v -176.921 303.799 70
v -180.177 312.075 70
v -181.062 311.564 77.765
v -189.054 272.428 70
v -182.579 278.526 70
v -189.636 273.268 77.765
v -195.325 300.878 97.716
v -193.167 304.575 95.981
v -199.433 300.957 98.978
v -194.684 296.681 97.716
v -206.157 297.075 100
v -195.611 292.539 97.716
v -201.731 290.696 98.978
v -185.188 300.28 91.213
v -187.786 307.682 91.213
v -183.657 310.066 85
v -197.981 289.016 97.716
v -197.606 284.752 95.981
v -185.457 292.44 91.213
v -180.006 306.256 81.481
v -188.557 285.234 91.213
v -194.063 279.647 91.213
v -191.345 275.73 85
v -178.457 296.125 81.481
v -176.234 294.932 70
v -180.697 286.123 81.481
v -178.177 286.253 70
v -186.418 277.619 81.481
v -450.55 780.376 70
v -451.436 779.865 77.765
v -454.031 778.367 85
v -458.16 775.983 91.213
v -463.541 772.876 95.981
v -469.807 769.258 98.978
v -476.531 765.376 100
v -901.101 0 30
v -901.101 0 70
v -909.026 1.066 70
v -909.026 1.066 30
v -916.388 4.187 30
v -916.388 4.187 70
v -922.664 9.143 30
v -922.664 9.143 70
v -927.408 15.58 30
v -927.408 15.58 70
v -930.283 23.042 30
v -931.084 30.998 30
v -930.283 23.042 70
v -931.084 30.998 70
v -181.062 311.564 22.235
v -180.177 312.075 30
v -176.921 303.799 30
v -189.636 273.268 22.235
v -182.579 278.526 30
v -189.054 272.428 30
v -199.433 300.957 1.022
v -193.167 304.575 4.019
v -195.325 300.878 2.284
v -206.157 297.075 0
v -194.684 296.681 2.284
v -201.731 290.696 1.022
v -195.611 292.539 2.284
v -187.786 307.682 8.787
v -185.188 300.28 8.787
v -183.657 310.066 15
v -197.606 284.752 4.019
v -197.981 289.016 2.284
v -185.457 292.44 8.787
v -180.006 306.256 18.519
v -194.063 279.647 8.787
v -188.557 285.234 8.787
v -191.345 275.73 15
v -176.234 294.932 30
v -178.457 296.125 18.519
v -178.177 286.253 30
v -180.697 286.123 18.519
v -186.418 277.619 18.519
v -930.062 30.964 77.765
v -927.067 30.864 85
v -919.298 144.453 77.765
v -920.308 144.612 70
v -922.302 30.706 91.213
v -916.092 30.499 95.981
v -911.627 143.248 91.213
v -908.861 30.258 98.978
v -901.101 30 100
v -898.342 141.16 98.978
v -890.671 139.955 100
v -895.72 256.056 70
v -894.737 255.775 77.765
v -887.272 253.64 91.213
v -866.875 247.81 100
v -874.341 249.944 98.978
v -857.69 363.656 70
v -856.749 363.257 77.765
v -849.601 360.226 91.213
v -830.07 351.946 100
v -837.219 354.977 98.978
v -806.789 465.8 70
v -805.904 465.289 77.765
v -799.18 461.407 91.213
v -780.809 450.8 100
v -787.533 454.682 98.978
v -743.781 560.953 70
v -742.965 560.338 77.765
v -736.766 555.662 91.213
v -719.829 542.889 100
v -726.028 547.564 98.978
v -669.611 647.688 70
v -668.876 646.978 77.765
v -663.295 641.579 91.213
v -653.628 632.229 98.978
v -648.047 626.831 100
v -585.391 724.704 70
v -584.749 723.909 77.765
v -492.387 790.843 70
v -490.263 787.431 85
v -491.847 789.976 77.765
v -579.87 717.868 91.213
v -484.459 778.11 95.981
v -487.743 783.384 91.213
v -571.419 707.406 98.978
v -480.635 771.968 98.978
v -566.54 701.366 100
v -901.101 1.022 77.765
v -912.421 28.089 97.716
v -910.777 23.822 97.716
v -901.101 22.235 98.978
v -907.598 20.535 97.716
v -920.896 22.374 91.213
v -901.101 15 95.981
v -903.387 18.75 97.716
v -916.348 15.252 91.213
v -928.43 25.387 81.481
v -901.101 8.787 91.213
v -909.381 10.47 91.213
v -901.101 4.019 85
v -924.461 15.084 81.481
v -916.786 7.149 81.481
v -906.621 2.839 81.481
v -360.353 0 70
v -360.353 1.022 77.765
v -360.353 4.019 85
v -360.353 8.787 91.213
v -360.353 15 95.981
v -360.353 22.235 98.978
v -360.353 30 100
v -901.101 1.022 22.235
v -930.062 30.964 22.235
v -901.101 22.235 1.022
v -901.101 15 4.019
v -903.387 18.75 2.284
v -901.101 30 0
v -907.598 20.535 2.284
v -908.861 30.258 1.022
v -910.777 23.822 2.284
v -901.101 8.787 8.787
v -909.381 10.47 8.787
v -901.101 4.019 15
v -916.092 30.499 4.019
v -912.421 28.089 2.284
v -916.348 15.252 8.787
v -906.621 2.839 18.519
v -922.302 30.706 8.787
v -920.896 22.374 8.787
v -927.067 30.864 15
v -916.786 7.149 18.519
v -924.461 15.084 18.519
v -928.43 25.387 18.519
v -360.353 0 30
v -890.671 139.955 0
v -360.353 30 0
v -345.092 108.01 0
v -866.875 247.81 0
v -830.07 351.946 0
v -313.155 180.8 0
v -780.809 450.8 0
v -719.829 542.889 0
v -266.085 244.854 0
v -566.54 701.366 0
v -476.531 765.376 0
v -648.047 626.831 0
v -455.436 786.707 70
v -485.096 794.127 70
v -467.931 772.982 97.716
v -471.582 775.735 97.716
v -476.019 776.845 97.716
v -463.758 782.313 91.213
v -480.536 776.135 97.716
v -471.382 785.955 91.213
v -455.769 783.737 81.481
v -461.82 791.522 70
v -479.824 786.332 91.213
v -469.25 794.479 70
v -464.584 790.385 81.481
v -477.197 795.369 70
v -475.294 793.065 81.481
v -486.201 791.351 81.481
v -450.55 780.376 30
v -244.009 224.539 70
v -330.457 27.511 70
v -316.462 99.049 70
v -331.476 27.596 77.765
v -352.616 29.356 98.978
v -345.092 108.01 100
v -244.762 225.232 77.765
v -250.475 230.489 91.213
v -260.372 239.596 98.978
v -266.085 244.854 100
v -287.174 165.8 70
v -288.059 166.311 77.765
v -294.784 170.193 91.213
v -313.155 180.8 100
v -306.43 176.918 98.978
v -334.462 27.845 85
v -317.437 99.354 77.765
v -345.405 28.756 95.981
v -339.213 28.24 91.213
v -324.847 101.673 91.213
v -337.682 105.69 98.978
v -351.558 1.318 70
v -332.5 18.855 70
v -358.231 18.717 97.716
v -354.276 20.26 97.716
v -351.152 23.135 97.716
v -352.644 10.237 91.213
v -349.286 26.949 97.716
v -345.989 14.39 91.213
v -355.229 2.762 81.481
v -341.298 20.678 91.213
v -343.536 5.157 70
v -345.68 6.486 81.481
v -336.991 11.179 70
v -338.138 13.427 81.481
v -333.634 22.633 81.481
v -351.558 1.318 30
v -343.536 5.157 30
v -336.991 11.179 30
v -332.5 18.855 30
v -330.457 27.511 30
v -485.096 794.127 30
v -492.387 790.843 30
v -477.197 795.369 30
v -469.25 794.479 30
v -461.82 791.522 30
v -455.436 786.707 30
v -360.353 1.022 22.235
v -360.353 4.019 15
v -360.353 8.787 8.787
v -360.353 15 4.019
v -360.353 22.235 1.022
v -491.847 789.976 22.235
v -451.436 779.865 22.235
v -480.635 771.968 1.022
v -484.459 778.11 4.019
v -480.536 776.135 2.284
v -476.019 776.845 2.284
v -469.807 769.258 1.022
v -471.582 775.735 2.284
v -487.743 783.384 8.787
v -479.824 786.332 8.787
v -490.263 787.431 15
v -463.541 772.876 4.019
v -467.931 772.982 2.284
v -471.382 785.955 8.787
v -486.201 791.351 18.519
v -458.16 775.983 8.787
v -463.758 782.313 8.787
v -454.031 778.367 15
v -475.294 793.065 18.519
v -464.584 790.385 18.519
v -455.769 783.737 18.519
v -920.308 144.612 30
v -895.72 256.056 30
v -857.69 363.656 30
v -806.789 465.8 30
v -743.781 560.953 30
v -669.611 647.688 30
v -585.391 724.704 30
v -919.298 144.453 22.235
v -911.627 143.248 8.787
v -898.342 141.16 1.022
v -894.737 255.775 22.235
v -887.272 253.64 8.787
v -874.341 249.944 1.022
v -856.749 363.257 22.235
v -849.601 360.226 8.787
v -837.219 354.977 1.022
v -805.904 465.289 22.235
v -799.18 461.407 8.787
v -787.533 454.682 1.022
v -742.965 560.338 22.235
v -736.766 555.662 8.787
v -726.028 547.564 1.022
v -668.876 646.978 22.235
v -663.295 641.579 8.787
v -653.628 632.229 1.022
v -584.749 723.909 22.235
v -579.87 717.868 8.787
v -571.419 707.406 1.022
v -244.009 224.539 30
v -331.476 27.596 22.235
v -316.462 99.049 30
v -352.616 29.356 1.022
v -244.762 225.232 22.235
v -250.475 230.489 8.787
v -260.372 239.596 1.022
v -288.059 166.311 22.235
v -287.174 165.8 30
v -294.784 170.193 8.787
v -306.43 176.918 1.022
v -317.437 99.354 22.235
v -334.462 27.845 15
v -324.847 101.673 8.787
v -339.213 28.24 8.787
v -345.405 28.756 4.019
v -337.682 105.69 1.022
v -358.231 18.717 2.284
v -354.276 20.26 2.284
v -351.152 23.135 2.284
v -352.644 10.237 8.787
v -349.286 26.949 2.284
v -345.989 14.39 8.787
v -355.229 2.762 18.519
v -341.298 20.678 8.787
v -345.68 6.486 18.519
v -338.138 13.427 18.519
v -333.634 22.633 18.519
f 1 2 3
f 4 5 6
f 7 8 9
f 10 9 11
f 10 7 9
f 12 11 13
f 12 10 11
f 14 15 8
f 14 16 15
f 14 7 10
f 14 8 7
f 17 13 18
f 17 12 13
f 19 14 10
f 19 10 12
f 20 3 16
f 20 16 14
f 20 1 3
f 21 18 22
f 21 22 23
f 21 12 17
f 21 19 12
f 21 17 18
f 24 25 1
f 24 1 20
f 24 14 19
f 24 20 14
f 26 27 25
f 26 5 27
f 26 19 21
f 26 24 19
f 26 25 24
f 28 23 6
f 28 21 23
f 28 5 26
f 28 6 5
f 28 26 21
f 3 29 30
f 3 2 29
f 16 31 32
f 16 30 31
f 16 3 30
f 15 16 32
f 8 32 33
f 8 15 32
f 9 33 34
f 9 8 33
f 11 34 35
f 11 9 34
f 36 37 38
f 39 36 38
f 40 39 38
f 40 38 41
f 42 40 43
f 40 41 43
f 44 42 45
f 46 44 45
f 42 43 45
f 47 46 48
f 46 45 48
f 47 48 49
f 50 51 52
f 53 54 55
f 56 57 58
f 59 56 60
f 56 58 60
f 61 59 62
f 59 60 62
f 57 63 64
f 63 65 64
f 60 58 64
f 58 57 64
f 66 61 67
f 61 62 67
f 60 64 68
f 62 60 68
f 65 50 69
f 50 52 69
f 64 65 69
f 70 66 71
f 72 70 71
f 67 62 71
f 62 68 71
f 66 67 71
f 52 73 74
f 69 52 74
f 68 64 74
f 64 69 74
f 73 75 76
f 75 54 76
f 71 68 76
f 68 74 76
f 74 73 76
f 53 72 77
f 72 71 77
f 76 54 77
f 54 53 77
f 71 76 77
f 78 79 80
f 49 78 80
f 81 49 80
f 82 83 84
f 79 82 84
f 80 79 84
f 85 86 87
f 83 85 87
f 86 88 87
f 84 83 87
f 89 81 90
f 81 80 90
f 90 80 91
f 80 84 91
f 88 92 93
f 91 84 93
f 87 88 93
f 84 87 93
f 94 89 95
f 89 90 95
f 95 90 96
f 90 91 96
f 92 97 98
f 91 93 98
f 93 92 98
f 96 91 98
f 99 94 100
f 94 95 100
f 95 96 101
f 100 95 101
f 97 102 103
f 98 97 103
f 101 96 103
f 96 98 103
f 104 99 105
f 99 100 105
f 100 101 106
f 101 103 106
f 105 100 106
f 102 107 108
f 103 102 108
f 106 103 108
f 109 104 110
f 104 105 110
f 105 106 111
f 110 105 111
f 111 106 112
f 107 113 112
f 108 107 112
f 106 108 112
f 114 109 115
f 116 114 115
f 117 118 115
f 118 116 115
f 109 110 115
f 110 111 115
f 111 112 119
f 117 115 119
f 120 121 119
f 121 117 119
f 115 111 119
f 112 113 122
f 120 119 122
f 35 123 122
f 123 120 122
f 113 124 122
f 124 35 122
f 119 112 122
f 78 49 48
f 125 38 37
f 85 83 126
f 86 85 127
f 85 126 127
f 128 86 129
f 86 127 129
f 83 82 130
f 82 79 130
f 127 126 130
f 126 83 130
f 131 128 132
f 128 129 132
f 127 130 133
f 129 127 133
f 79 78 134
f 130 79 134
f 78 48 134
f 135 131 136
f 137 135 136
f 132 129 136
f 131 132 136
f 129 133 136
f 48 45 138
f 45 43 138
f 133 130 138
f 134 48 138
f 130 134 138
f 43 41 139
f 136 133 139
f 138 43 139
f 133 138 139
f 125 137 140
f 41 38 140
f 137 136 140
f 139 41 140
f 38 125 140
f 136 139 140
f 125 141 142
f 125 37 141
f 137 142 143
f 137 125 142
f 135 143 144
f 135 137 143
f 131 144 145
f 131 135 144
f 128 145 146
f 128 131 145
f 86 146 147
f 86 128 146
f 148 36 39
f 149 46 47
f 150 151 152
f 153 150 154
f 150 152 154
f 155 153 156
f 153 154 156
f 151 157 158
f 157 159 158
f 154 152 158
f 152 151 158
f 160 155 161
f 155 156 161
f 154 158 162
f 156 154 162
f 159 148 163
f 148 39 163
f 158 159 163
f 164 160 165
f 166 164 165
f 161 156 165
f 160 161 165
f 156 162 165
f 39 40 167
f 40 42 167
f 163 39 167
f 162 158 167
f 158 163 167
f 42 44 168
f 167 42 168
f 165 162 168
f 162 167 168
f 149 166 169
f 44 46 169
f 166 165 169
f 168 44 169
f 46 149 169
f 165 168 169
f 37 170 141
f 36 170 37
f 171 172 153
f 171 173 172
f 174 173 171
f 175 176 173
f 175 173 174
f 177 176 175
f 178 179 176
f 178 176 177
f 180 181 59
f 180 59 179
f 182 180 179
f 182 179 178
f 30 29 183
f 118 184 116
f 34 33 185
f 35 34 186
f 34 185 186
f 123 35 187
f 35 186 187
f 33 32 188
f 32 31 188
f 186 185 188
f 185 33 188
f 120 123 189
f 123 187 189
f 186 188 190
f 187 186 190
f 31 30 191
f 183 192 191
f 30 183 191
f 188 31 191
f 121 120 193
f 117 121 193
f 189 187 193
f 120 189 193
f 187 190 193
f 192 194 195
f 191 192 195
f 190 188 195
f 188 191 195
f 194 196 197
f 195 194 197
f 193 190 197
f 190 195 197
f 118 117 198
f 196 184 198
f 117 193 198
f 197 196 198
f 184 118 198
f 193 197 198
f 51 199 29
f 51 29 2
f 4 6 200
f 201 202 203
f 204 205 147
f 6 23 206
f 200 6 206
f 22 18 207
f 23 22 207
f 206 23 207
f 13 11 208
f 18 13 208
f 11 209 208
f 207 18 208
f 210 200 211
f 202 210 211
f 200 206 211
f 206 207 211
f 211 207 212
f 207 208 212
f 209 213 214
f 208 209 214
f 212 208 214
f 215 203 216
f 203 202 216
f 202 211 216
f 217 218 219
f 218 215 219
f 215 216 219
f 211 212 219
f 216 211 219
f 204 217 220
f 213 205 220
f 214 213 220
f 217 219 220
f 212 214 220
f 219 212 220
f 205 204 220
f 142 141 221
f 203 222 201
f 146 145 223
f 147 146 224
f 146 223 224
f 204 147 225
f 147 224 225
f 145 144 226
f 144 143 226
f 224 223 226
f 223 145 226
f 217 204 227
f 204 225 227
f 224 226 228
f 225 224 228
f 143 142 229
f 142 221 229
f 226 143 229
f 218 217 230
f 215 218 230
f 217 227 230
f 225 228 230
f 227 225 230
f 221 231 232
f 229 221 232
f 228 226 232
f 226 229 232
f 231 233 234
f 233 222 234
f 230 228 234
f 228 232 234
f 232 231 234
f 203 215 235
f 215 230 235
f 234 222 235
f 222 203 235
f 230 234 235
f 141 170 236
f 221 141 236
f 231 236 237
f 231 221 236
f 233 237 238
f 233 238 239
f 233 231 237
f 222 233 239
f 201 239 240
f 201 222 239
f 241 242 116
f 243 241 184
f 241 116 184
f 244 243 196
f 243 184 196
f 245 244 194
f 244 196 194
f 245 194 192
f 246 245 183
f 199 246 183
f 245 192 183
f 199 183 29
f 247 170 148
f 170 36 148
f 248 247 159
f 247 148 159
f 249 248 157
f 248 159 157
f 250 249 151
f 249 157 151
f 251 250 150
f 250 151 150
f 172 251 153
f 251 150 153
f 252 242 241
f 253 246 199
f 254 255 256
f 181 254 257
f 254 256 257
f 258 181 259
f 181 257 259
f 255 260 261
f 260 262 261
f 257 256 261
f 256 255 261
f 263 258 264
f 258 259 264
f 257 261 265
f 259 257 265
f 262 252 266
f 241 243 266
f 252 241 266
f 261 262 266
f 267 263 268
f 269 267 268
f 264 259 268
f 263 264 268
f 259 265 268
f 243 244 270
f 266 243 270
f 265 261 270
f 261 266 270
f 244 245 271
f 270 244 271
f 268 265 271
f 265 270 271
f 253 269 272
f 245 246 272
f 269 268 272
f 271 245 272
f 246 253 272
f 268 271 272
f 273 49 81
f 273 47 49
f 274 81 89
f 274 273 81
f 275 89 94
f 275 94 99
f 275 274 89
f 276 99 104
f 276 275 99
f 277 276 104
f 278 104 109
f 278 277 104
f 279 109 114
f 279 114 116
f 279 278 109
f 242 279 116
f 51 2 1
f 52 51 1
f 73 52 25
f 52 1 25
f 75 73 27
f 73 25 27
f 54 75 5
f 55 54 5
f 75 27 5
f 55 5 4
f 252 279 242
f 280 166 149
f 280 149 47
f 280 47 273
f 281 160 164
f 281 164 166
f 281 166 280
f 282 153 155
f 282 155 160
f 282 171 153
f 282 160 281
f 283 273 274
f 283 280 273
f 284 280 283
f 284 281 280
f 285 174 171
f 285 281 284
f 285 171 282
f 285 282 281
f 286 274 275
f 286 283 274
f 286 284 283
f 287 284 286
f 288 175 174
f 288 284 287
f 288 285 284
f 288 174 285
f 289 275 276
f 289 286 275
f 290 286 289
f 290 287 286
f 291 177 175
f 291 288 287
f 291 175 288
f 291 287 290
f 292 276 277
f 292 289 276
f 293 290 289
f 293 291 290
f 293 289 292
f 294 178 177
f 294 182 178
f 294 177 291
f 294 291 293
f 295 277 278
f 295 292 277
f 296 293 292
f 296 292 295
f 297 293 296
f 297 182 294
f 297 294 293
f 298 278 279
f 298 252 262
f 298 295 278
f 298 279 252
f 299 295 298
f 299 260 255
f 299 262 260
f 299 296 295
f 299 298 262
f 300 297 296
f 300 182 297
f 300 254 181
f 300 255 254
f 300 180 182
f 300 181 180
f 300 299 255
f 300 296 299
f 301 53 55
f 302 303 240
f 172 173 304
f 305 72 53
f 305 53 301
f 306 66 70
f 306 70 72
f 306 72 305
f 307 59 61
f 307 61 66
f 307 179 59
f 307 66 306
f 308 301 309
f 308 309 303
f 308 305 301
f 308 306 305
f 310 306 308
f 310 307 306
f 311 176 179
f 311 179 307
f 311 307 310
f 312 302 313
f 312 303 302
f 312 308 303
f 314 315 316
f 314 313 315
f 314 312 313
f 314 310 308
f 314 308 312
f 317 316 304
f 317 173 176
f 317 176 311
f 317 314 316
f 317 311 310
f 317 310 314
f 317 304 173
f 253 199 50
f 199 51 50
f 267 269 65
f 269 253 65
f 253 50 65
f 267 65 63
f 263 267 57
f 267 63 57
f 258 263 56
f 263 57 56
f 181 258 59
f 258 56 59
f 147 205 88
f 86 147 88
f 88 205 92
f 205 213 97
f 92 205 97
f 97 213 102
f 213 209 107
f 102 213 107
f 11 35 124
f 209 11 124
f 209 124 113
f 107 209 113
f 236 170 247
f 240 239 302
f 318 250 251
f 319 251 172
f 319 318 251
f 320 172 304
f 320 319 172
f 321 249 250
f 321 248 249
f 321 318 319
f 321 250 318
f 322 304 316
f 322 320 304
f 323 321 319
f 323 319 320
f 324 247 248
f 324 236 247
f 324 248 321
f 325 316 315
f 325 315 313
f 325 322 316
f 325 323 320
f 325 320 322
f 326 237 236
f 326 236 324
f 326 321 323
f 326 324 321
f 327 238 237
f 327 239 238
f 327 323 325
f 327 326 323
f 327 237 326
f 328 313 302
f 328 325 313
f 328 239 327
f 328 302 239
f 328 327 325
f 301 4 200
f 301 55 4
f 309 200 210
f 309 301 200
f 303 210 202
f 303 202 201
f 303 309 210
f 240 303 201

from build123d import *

# Parameters (mm, degrees)
BOSS_EXTRUDE1_DEPTH = 100
FILLET1_R           = 30


with BuildPart() as part:
    # Sketch1 → Boss-Extrude1 (new body)
    with BuildSketch(Plane.XY):
        with BuildLine():
            Line((-331.6, 0), (-931.6, 0))
            ThreePointArc((-931.6, 0), (-806.789266166, 465.8), (-465.8, 806.789266166))
            Line((-465.8, 806.789266166), (-165.8, 287.174023895))
            ThreePointArc((-165.8, 287.174023895), (-287.174023895, 165.8), (-331.6, 0))
        make_face()
    extrude(amount=BOSS_EXTRUDE1_DEPTH)

    # Fillet1
    fillet1_edges = [part.edges().sort_by_distance(p)[0] for p in [
        (-806.789266166, 465.8, 100),
        (-631.6, 0, 100),
        (-287.174023895, 165.8, 100),
        (-631.6, 0, 0),
        (-806.789266166, 465.8, 0),
        (-315.8, 546.98164503, 0),
        (-287.174023895, 165.8, 0),
        (-331.6, 0, 50),
        (-931.6, 0, 50),
        (-465.8, 806.789266166, 50),
        (-165.8, 287.174023895, 50),
        (-315.8, 546.98164503, 100),
    ]]
    fillet(fillet1_edges, radius=FILLET1_R)


solid = part.part
